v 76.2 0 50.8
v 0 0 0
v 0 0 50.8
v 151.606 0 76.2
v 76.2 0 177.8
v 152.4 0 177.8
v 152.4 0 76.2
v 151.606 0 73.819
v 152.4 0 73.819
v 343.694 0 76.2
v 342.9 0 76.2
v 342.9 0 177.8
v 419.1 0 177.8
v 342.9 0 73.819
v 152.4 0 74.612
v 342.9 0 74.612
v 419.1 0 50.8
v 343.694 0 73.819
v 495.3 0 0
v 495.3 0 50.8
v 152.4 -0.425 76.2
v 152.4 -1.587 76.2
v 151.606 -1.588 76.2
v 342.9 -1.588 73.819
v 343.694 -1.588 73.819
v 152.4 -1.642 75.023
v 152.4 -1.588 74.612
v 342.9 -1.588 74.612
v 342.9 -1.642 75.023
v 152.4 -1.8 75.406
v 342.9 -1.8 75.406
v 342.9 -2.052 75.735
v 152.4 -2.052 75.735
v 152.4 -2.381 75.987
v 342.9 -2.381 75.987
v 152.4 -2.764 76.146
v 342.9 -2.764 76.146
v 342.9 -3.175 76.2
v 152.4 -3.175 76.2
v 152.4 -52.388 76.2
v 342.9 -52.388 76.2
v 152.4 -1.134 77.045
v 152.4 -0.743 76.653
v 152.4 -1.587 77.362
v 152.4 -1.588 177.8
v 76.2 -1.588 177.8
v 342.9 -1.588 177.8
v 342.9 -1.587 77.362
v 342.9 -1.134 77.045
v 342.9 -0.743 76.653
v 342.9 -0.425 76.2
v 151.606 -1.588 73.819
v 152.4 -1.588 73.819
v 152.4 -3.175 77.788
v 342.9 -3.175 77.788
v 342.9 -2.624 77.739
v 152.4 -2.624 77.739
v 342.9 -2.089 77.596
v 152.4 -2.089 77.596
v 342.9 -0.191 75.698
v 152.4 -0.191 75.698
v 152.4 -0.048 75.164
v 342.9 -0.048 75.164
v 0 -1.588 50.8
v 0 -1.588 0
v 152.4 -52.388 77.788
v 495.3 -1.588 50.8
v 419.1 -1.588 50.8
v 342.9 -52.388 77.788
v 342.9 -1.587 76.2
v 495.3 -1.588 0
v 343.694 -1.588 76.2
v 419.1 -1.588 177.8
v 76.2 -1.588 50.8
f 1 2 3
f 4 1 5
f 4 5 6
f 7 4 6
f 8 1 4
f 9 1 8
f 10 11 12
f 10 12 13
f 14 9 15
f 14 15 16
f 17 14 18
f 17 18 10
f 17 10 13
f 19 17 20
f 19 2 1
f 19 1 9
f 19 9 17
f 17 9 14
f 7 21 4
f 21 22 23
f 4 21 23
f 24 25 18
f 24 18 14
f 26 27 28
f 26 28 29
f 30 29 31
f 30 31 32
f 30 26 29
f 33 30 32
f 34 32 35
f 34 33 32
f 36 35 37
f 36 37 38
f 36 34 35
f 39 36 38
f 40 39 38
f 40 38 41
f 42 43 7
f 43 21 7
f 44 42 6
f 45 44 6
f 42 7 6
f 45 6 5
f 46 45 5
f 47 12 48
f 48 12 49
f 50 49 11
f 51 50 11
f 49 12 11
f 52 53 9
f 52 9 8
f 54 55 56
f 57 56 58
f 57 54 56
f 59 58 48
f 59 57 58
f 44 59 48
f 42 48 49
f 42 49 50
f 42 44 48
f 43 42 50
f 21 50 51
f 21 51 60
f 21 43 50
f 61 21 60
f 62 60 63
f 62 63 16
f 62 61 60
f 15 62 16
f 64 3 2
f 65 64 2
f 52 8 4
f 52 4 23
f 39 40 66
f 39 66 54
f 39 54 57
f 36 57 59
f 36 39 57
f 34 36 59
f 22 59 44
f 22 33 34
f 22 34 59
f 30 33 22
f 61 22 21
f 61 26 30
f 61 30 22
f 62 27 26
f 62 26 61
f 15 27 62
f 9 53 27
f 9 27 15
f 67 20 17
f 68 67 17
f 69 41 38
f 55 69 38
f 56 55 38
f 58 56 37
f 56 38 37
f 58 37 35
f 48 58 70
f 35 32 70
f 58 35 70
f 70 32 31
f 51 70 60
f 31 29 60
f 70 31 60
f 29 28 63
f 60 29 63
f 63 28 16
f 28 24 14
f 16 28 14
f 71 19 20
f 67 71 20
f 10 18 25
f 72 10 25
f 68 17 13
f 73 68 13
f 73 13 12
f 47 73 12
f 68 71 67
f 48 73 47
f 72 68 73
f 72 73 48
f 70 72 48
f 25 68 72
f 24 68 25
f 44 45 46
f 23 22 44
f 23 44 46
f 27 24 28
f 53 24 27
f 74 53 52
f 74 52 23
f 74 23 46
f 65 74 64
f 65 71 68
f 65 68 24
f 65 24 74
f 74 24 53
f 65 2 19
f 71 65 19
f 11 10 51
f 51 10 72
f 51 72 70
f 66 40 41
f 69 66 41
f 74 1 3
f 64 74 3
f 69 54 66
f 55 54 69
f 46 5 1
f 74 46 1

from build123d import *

# Parameters (mm, degrees)
BASE_FLANGE1_DEPTH       = 1.5875
EDGE_FLANGE1_START       = -2.38125
EDGE_FLANGE1_OUTLINE_W   = 0.79375
EDGE_FLANGE1_OUTLINE_H   = 1.5875
EDGE_FLANGE1_DEPTH       = 2.38125
EDGE_FLANGE1_START_2     = 74.6125
EDGE_FLANGE1_2_OUTLINE_W = 190.5
EDGE_FLANGE1_2_OUTLINE_H = 50.8
EDGE_FLANGE1_2_DEPTH     = 3.175
EDGE_FLANGE1_START_3     = 76.2
EDGE_FLANGE1_3_OUTLINE_W = 190.5
EDGE_FLANGE1_3_OUTLINE_H = 1.5875
EDGE_FLANGE1_3_DEPTH     = 1.2613005
EDGE_FLANGE1_START_4     = 152.4
EDGE_FLANGE1_4_DEPTH     = 190.5


with BuildPart() as part:
    # Base-Flange1: sheet metal written as solids
    # Sketch1 → Base-Flange1 (new body)
    with BuildSketch(Plane(origin=(0, 0, 0), x_dir=(1, 0, 0), z_dir=(0, 1, 0))):
        Polygon((0, 0), (495.3, 0), (495.3, -50.8), (419.1, -50.8), (419.1, -177.8), (342.9, -177.8), (342.9, -76.2), (152.4, -76.2), (152.4, -177.8), (76.2, -177.8), (76.2, -50.8), (0, -50.8), align=None)
    extrude(amount=-BASE_FLANGE1_DEPTH)

    # Edge-Flange1: read off the stored shape, not the designer's step
    # Edge-Flange1 outline → Edge-Flange1 (cut)
    with BuildSketch(Plane(origin=(0, -1.5875, 76.2), x_dir=(-1, 0, 0), z_dir=(0, 0, 1)).offset(EDGE_FLANGE1_START)):
        with Locations((-152.003125, -0.79375)):
            Rectangle(EDGE_FLANGE1_OUTLINE_W, EDGE_FLANGE1_OUTLINE_H)
        with Locations((-343.296875, -0.79375)):
            Rectangle(EDGE_FLANGE1_OUTLINE_W, EDGE_FLANGE1_OUTLINE_H)
    extrude(amount=EDGE_FLANGE1_DEPTH, mode=Mode.SUBTRACT)

    # Edge-Flange1 2 outline → Edge-Flange1 2 (add)
    with BuildSketch(Plane.XY.offset(EDGE_FLANGE1_START_2)):
        with Locations((247.65, -26.9875)):
            Rectangle(EDGE_FLANGE1_2_OUTLINE_W, EDGE_FLANGE1_2_OUTLINE_H)
    extrude(amount=EDGE_FLANGE1_2_DEPTH)

    # Edge-Flange1 3 outline → Edge-Flange1 3 (add)
    with BuildSketch(Plane.XY.offset(EDGE_FLANGE1_START_3)):
        with Locations((247.65, -0.79375)):
            Rectangle(EDGE_FLANGE1_3_OUTLINE_W, EDGE_FLANGE1_3_OUTLINE_H)
    extrude(amount=EDGE_FLANGE1_3_DEPTH)

    # Edge-Flange1 4 outline → Edge-Flange1 4 (cut)
    with BuildSketch(Plane.YZ.offset(EDGE_FLANGE1_START_4)):
        with BuildLine():
            Line((-3.175, 76.2), (-52.3875, 76.2))
            Line((-52.3875, 76.2), (-52.3875, 74.6125))
            Line((-52.3875, 74.6125), (-1.5875, 74.6125))
            ThreePointArc((-1.5875, 74.6125), (-2.052467985, 75.735032015), (-3.175, 76.2))
        make_face()
        with BuildLine():
            Line((-1.5875, 77.7875), (-3.175, 77.7875))
            ThreePointArc((-3.175, 77.7875), (-0.92993597, 76.85756403), (0, 74.6125))
            Line((0, 74.6125), (0, 77.4613005))
            Line((0, 77.4613005), (-1.5875, 77.4613005))
            Line((-1.5875, 77.4613005), (-1.5875, 77.7875))
        make_face()
    extrude(amount=EDGE_FLANGE1_4_DEPTH, mode=Mode.SUBTRACT)


solid = part.part
